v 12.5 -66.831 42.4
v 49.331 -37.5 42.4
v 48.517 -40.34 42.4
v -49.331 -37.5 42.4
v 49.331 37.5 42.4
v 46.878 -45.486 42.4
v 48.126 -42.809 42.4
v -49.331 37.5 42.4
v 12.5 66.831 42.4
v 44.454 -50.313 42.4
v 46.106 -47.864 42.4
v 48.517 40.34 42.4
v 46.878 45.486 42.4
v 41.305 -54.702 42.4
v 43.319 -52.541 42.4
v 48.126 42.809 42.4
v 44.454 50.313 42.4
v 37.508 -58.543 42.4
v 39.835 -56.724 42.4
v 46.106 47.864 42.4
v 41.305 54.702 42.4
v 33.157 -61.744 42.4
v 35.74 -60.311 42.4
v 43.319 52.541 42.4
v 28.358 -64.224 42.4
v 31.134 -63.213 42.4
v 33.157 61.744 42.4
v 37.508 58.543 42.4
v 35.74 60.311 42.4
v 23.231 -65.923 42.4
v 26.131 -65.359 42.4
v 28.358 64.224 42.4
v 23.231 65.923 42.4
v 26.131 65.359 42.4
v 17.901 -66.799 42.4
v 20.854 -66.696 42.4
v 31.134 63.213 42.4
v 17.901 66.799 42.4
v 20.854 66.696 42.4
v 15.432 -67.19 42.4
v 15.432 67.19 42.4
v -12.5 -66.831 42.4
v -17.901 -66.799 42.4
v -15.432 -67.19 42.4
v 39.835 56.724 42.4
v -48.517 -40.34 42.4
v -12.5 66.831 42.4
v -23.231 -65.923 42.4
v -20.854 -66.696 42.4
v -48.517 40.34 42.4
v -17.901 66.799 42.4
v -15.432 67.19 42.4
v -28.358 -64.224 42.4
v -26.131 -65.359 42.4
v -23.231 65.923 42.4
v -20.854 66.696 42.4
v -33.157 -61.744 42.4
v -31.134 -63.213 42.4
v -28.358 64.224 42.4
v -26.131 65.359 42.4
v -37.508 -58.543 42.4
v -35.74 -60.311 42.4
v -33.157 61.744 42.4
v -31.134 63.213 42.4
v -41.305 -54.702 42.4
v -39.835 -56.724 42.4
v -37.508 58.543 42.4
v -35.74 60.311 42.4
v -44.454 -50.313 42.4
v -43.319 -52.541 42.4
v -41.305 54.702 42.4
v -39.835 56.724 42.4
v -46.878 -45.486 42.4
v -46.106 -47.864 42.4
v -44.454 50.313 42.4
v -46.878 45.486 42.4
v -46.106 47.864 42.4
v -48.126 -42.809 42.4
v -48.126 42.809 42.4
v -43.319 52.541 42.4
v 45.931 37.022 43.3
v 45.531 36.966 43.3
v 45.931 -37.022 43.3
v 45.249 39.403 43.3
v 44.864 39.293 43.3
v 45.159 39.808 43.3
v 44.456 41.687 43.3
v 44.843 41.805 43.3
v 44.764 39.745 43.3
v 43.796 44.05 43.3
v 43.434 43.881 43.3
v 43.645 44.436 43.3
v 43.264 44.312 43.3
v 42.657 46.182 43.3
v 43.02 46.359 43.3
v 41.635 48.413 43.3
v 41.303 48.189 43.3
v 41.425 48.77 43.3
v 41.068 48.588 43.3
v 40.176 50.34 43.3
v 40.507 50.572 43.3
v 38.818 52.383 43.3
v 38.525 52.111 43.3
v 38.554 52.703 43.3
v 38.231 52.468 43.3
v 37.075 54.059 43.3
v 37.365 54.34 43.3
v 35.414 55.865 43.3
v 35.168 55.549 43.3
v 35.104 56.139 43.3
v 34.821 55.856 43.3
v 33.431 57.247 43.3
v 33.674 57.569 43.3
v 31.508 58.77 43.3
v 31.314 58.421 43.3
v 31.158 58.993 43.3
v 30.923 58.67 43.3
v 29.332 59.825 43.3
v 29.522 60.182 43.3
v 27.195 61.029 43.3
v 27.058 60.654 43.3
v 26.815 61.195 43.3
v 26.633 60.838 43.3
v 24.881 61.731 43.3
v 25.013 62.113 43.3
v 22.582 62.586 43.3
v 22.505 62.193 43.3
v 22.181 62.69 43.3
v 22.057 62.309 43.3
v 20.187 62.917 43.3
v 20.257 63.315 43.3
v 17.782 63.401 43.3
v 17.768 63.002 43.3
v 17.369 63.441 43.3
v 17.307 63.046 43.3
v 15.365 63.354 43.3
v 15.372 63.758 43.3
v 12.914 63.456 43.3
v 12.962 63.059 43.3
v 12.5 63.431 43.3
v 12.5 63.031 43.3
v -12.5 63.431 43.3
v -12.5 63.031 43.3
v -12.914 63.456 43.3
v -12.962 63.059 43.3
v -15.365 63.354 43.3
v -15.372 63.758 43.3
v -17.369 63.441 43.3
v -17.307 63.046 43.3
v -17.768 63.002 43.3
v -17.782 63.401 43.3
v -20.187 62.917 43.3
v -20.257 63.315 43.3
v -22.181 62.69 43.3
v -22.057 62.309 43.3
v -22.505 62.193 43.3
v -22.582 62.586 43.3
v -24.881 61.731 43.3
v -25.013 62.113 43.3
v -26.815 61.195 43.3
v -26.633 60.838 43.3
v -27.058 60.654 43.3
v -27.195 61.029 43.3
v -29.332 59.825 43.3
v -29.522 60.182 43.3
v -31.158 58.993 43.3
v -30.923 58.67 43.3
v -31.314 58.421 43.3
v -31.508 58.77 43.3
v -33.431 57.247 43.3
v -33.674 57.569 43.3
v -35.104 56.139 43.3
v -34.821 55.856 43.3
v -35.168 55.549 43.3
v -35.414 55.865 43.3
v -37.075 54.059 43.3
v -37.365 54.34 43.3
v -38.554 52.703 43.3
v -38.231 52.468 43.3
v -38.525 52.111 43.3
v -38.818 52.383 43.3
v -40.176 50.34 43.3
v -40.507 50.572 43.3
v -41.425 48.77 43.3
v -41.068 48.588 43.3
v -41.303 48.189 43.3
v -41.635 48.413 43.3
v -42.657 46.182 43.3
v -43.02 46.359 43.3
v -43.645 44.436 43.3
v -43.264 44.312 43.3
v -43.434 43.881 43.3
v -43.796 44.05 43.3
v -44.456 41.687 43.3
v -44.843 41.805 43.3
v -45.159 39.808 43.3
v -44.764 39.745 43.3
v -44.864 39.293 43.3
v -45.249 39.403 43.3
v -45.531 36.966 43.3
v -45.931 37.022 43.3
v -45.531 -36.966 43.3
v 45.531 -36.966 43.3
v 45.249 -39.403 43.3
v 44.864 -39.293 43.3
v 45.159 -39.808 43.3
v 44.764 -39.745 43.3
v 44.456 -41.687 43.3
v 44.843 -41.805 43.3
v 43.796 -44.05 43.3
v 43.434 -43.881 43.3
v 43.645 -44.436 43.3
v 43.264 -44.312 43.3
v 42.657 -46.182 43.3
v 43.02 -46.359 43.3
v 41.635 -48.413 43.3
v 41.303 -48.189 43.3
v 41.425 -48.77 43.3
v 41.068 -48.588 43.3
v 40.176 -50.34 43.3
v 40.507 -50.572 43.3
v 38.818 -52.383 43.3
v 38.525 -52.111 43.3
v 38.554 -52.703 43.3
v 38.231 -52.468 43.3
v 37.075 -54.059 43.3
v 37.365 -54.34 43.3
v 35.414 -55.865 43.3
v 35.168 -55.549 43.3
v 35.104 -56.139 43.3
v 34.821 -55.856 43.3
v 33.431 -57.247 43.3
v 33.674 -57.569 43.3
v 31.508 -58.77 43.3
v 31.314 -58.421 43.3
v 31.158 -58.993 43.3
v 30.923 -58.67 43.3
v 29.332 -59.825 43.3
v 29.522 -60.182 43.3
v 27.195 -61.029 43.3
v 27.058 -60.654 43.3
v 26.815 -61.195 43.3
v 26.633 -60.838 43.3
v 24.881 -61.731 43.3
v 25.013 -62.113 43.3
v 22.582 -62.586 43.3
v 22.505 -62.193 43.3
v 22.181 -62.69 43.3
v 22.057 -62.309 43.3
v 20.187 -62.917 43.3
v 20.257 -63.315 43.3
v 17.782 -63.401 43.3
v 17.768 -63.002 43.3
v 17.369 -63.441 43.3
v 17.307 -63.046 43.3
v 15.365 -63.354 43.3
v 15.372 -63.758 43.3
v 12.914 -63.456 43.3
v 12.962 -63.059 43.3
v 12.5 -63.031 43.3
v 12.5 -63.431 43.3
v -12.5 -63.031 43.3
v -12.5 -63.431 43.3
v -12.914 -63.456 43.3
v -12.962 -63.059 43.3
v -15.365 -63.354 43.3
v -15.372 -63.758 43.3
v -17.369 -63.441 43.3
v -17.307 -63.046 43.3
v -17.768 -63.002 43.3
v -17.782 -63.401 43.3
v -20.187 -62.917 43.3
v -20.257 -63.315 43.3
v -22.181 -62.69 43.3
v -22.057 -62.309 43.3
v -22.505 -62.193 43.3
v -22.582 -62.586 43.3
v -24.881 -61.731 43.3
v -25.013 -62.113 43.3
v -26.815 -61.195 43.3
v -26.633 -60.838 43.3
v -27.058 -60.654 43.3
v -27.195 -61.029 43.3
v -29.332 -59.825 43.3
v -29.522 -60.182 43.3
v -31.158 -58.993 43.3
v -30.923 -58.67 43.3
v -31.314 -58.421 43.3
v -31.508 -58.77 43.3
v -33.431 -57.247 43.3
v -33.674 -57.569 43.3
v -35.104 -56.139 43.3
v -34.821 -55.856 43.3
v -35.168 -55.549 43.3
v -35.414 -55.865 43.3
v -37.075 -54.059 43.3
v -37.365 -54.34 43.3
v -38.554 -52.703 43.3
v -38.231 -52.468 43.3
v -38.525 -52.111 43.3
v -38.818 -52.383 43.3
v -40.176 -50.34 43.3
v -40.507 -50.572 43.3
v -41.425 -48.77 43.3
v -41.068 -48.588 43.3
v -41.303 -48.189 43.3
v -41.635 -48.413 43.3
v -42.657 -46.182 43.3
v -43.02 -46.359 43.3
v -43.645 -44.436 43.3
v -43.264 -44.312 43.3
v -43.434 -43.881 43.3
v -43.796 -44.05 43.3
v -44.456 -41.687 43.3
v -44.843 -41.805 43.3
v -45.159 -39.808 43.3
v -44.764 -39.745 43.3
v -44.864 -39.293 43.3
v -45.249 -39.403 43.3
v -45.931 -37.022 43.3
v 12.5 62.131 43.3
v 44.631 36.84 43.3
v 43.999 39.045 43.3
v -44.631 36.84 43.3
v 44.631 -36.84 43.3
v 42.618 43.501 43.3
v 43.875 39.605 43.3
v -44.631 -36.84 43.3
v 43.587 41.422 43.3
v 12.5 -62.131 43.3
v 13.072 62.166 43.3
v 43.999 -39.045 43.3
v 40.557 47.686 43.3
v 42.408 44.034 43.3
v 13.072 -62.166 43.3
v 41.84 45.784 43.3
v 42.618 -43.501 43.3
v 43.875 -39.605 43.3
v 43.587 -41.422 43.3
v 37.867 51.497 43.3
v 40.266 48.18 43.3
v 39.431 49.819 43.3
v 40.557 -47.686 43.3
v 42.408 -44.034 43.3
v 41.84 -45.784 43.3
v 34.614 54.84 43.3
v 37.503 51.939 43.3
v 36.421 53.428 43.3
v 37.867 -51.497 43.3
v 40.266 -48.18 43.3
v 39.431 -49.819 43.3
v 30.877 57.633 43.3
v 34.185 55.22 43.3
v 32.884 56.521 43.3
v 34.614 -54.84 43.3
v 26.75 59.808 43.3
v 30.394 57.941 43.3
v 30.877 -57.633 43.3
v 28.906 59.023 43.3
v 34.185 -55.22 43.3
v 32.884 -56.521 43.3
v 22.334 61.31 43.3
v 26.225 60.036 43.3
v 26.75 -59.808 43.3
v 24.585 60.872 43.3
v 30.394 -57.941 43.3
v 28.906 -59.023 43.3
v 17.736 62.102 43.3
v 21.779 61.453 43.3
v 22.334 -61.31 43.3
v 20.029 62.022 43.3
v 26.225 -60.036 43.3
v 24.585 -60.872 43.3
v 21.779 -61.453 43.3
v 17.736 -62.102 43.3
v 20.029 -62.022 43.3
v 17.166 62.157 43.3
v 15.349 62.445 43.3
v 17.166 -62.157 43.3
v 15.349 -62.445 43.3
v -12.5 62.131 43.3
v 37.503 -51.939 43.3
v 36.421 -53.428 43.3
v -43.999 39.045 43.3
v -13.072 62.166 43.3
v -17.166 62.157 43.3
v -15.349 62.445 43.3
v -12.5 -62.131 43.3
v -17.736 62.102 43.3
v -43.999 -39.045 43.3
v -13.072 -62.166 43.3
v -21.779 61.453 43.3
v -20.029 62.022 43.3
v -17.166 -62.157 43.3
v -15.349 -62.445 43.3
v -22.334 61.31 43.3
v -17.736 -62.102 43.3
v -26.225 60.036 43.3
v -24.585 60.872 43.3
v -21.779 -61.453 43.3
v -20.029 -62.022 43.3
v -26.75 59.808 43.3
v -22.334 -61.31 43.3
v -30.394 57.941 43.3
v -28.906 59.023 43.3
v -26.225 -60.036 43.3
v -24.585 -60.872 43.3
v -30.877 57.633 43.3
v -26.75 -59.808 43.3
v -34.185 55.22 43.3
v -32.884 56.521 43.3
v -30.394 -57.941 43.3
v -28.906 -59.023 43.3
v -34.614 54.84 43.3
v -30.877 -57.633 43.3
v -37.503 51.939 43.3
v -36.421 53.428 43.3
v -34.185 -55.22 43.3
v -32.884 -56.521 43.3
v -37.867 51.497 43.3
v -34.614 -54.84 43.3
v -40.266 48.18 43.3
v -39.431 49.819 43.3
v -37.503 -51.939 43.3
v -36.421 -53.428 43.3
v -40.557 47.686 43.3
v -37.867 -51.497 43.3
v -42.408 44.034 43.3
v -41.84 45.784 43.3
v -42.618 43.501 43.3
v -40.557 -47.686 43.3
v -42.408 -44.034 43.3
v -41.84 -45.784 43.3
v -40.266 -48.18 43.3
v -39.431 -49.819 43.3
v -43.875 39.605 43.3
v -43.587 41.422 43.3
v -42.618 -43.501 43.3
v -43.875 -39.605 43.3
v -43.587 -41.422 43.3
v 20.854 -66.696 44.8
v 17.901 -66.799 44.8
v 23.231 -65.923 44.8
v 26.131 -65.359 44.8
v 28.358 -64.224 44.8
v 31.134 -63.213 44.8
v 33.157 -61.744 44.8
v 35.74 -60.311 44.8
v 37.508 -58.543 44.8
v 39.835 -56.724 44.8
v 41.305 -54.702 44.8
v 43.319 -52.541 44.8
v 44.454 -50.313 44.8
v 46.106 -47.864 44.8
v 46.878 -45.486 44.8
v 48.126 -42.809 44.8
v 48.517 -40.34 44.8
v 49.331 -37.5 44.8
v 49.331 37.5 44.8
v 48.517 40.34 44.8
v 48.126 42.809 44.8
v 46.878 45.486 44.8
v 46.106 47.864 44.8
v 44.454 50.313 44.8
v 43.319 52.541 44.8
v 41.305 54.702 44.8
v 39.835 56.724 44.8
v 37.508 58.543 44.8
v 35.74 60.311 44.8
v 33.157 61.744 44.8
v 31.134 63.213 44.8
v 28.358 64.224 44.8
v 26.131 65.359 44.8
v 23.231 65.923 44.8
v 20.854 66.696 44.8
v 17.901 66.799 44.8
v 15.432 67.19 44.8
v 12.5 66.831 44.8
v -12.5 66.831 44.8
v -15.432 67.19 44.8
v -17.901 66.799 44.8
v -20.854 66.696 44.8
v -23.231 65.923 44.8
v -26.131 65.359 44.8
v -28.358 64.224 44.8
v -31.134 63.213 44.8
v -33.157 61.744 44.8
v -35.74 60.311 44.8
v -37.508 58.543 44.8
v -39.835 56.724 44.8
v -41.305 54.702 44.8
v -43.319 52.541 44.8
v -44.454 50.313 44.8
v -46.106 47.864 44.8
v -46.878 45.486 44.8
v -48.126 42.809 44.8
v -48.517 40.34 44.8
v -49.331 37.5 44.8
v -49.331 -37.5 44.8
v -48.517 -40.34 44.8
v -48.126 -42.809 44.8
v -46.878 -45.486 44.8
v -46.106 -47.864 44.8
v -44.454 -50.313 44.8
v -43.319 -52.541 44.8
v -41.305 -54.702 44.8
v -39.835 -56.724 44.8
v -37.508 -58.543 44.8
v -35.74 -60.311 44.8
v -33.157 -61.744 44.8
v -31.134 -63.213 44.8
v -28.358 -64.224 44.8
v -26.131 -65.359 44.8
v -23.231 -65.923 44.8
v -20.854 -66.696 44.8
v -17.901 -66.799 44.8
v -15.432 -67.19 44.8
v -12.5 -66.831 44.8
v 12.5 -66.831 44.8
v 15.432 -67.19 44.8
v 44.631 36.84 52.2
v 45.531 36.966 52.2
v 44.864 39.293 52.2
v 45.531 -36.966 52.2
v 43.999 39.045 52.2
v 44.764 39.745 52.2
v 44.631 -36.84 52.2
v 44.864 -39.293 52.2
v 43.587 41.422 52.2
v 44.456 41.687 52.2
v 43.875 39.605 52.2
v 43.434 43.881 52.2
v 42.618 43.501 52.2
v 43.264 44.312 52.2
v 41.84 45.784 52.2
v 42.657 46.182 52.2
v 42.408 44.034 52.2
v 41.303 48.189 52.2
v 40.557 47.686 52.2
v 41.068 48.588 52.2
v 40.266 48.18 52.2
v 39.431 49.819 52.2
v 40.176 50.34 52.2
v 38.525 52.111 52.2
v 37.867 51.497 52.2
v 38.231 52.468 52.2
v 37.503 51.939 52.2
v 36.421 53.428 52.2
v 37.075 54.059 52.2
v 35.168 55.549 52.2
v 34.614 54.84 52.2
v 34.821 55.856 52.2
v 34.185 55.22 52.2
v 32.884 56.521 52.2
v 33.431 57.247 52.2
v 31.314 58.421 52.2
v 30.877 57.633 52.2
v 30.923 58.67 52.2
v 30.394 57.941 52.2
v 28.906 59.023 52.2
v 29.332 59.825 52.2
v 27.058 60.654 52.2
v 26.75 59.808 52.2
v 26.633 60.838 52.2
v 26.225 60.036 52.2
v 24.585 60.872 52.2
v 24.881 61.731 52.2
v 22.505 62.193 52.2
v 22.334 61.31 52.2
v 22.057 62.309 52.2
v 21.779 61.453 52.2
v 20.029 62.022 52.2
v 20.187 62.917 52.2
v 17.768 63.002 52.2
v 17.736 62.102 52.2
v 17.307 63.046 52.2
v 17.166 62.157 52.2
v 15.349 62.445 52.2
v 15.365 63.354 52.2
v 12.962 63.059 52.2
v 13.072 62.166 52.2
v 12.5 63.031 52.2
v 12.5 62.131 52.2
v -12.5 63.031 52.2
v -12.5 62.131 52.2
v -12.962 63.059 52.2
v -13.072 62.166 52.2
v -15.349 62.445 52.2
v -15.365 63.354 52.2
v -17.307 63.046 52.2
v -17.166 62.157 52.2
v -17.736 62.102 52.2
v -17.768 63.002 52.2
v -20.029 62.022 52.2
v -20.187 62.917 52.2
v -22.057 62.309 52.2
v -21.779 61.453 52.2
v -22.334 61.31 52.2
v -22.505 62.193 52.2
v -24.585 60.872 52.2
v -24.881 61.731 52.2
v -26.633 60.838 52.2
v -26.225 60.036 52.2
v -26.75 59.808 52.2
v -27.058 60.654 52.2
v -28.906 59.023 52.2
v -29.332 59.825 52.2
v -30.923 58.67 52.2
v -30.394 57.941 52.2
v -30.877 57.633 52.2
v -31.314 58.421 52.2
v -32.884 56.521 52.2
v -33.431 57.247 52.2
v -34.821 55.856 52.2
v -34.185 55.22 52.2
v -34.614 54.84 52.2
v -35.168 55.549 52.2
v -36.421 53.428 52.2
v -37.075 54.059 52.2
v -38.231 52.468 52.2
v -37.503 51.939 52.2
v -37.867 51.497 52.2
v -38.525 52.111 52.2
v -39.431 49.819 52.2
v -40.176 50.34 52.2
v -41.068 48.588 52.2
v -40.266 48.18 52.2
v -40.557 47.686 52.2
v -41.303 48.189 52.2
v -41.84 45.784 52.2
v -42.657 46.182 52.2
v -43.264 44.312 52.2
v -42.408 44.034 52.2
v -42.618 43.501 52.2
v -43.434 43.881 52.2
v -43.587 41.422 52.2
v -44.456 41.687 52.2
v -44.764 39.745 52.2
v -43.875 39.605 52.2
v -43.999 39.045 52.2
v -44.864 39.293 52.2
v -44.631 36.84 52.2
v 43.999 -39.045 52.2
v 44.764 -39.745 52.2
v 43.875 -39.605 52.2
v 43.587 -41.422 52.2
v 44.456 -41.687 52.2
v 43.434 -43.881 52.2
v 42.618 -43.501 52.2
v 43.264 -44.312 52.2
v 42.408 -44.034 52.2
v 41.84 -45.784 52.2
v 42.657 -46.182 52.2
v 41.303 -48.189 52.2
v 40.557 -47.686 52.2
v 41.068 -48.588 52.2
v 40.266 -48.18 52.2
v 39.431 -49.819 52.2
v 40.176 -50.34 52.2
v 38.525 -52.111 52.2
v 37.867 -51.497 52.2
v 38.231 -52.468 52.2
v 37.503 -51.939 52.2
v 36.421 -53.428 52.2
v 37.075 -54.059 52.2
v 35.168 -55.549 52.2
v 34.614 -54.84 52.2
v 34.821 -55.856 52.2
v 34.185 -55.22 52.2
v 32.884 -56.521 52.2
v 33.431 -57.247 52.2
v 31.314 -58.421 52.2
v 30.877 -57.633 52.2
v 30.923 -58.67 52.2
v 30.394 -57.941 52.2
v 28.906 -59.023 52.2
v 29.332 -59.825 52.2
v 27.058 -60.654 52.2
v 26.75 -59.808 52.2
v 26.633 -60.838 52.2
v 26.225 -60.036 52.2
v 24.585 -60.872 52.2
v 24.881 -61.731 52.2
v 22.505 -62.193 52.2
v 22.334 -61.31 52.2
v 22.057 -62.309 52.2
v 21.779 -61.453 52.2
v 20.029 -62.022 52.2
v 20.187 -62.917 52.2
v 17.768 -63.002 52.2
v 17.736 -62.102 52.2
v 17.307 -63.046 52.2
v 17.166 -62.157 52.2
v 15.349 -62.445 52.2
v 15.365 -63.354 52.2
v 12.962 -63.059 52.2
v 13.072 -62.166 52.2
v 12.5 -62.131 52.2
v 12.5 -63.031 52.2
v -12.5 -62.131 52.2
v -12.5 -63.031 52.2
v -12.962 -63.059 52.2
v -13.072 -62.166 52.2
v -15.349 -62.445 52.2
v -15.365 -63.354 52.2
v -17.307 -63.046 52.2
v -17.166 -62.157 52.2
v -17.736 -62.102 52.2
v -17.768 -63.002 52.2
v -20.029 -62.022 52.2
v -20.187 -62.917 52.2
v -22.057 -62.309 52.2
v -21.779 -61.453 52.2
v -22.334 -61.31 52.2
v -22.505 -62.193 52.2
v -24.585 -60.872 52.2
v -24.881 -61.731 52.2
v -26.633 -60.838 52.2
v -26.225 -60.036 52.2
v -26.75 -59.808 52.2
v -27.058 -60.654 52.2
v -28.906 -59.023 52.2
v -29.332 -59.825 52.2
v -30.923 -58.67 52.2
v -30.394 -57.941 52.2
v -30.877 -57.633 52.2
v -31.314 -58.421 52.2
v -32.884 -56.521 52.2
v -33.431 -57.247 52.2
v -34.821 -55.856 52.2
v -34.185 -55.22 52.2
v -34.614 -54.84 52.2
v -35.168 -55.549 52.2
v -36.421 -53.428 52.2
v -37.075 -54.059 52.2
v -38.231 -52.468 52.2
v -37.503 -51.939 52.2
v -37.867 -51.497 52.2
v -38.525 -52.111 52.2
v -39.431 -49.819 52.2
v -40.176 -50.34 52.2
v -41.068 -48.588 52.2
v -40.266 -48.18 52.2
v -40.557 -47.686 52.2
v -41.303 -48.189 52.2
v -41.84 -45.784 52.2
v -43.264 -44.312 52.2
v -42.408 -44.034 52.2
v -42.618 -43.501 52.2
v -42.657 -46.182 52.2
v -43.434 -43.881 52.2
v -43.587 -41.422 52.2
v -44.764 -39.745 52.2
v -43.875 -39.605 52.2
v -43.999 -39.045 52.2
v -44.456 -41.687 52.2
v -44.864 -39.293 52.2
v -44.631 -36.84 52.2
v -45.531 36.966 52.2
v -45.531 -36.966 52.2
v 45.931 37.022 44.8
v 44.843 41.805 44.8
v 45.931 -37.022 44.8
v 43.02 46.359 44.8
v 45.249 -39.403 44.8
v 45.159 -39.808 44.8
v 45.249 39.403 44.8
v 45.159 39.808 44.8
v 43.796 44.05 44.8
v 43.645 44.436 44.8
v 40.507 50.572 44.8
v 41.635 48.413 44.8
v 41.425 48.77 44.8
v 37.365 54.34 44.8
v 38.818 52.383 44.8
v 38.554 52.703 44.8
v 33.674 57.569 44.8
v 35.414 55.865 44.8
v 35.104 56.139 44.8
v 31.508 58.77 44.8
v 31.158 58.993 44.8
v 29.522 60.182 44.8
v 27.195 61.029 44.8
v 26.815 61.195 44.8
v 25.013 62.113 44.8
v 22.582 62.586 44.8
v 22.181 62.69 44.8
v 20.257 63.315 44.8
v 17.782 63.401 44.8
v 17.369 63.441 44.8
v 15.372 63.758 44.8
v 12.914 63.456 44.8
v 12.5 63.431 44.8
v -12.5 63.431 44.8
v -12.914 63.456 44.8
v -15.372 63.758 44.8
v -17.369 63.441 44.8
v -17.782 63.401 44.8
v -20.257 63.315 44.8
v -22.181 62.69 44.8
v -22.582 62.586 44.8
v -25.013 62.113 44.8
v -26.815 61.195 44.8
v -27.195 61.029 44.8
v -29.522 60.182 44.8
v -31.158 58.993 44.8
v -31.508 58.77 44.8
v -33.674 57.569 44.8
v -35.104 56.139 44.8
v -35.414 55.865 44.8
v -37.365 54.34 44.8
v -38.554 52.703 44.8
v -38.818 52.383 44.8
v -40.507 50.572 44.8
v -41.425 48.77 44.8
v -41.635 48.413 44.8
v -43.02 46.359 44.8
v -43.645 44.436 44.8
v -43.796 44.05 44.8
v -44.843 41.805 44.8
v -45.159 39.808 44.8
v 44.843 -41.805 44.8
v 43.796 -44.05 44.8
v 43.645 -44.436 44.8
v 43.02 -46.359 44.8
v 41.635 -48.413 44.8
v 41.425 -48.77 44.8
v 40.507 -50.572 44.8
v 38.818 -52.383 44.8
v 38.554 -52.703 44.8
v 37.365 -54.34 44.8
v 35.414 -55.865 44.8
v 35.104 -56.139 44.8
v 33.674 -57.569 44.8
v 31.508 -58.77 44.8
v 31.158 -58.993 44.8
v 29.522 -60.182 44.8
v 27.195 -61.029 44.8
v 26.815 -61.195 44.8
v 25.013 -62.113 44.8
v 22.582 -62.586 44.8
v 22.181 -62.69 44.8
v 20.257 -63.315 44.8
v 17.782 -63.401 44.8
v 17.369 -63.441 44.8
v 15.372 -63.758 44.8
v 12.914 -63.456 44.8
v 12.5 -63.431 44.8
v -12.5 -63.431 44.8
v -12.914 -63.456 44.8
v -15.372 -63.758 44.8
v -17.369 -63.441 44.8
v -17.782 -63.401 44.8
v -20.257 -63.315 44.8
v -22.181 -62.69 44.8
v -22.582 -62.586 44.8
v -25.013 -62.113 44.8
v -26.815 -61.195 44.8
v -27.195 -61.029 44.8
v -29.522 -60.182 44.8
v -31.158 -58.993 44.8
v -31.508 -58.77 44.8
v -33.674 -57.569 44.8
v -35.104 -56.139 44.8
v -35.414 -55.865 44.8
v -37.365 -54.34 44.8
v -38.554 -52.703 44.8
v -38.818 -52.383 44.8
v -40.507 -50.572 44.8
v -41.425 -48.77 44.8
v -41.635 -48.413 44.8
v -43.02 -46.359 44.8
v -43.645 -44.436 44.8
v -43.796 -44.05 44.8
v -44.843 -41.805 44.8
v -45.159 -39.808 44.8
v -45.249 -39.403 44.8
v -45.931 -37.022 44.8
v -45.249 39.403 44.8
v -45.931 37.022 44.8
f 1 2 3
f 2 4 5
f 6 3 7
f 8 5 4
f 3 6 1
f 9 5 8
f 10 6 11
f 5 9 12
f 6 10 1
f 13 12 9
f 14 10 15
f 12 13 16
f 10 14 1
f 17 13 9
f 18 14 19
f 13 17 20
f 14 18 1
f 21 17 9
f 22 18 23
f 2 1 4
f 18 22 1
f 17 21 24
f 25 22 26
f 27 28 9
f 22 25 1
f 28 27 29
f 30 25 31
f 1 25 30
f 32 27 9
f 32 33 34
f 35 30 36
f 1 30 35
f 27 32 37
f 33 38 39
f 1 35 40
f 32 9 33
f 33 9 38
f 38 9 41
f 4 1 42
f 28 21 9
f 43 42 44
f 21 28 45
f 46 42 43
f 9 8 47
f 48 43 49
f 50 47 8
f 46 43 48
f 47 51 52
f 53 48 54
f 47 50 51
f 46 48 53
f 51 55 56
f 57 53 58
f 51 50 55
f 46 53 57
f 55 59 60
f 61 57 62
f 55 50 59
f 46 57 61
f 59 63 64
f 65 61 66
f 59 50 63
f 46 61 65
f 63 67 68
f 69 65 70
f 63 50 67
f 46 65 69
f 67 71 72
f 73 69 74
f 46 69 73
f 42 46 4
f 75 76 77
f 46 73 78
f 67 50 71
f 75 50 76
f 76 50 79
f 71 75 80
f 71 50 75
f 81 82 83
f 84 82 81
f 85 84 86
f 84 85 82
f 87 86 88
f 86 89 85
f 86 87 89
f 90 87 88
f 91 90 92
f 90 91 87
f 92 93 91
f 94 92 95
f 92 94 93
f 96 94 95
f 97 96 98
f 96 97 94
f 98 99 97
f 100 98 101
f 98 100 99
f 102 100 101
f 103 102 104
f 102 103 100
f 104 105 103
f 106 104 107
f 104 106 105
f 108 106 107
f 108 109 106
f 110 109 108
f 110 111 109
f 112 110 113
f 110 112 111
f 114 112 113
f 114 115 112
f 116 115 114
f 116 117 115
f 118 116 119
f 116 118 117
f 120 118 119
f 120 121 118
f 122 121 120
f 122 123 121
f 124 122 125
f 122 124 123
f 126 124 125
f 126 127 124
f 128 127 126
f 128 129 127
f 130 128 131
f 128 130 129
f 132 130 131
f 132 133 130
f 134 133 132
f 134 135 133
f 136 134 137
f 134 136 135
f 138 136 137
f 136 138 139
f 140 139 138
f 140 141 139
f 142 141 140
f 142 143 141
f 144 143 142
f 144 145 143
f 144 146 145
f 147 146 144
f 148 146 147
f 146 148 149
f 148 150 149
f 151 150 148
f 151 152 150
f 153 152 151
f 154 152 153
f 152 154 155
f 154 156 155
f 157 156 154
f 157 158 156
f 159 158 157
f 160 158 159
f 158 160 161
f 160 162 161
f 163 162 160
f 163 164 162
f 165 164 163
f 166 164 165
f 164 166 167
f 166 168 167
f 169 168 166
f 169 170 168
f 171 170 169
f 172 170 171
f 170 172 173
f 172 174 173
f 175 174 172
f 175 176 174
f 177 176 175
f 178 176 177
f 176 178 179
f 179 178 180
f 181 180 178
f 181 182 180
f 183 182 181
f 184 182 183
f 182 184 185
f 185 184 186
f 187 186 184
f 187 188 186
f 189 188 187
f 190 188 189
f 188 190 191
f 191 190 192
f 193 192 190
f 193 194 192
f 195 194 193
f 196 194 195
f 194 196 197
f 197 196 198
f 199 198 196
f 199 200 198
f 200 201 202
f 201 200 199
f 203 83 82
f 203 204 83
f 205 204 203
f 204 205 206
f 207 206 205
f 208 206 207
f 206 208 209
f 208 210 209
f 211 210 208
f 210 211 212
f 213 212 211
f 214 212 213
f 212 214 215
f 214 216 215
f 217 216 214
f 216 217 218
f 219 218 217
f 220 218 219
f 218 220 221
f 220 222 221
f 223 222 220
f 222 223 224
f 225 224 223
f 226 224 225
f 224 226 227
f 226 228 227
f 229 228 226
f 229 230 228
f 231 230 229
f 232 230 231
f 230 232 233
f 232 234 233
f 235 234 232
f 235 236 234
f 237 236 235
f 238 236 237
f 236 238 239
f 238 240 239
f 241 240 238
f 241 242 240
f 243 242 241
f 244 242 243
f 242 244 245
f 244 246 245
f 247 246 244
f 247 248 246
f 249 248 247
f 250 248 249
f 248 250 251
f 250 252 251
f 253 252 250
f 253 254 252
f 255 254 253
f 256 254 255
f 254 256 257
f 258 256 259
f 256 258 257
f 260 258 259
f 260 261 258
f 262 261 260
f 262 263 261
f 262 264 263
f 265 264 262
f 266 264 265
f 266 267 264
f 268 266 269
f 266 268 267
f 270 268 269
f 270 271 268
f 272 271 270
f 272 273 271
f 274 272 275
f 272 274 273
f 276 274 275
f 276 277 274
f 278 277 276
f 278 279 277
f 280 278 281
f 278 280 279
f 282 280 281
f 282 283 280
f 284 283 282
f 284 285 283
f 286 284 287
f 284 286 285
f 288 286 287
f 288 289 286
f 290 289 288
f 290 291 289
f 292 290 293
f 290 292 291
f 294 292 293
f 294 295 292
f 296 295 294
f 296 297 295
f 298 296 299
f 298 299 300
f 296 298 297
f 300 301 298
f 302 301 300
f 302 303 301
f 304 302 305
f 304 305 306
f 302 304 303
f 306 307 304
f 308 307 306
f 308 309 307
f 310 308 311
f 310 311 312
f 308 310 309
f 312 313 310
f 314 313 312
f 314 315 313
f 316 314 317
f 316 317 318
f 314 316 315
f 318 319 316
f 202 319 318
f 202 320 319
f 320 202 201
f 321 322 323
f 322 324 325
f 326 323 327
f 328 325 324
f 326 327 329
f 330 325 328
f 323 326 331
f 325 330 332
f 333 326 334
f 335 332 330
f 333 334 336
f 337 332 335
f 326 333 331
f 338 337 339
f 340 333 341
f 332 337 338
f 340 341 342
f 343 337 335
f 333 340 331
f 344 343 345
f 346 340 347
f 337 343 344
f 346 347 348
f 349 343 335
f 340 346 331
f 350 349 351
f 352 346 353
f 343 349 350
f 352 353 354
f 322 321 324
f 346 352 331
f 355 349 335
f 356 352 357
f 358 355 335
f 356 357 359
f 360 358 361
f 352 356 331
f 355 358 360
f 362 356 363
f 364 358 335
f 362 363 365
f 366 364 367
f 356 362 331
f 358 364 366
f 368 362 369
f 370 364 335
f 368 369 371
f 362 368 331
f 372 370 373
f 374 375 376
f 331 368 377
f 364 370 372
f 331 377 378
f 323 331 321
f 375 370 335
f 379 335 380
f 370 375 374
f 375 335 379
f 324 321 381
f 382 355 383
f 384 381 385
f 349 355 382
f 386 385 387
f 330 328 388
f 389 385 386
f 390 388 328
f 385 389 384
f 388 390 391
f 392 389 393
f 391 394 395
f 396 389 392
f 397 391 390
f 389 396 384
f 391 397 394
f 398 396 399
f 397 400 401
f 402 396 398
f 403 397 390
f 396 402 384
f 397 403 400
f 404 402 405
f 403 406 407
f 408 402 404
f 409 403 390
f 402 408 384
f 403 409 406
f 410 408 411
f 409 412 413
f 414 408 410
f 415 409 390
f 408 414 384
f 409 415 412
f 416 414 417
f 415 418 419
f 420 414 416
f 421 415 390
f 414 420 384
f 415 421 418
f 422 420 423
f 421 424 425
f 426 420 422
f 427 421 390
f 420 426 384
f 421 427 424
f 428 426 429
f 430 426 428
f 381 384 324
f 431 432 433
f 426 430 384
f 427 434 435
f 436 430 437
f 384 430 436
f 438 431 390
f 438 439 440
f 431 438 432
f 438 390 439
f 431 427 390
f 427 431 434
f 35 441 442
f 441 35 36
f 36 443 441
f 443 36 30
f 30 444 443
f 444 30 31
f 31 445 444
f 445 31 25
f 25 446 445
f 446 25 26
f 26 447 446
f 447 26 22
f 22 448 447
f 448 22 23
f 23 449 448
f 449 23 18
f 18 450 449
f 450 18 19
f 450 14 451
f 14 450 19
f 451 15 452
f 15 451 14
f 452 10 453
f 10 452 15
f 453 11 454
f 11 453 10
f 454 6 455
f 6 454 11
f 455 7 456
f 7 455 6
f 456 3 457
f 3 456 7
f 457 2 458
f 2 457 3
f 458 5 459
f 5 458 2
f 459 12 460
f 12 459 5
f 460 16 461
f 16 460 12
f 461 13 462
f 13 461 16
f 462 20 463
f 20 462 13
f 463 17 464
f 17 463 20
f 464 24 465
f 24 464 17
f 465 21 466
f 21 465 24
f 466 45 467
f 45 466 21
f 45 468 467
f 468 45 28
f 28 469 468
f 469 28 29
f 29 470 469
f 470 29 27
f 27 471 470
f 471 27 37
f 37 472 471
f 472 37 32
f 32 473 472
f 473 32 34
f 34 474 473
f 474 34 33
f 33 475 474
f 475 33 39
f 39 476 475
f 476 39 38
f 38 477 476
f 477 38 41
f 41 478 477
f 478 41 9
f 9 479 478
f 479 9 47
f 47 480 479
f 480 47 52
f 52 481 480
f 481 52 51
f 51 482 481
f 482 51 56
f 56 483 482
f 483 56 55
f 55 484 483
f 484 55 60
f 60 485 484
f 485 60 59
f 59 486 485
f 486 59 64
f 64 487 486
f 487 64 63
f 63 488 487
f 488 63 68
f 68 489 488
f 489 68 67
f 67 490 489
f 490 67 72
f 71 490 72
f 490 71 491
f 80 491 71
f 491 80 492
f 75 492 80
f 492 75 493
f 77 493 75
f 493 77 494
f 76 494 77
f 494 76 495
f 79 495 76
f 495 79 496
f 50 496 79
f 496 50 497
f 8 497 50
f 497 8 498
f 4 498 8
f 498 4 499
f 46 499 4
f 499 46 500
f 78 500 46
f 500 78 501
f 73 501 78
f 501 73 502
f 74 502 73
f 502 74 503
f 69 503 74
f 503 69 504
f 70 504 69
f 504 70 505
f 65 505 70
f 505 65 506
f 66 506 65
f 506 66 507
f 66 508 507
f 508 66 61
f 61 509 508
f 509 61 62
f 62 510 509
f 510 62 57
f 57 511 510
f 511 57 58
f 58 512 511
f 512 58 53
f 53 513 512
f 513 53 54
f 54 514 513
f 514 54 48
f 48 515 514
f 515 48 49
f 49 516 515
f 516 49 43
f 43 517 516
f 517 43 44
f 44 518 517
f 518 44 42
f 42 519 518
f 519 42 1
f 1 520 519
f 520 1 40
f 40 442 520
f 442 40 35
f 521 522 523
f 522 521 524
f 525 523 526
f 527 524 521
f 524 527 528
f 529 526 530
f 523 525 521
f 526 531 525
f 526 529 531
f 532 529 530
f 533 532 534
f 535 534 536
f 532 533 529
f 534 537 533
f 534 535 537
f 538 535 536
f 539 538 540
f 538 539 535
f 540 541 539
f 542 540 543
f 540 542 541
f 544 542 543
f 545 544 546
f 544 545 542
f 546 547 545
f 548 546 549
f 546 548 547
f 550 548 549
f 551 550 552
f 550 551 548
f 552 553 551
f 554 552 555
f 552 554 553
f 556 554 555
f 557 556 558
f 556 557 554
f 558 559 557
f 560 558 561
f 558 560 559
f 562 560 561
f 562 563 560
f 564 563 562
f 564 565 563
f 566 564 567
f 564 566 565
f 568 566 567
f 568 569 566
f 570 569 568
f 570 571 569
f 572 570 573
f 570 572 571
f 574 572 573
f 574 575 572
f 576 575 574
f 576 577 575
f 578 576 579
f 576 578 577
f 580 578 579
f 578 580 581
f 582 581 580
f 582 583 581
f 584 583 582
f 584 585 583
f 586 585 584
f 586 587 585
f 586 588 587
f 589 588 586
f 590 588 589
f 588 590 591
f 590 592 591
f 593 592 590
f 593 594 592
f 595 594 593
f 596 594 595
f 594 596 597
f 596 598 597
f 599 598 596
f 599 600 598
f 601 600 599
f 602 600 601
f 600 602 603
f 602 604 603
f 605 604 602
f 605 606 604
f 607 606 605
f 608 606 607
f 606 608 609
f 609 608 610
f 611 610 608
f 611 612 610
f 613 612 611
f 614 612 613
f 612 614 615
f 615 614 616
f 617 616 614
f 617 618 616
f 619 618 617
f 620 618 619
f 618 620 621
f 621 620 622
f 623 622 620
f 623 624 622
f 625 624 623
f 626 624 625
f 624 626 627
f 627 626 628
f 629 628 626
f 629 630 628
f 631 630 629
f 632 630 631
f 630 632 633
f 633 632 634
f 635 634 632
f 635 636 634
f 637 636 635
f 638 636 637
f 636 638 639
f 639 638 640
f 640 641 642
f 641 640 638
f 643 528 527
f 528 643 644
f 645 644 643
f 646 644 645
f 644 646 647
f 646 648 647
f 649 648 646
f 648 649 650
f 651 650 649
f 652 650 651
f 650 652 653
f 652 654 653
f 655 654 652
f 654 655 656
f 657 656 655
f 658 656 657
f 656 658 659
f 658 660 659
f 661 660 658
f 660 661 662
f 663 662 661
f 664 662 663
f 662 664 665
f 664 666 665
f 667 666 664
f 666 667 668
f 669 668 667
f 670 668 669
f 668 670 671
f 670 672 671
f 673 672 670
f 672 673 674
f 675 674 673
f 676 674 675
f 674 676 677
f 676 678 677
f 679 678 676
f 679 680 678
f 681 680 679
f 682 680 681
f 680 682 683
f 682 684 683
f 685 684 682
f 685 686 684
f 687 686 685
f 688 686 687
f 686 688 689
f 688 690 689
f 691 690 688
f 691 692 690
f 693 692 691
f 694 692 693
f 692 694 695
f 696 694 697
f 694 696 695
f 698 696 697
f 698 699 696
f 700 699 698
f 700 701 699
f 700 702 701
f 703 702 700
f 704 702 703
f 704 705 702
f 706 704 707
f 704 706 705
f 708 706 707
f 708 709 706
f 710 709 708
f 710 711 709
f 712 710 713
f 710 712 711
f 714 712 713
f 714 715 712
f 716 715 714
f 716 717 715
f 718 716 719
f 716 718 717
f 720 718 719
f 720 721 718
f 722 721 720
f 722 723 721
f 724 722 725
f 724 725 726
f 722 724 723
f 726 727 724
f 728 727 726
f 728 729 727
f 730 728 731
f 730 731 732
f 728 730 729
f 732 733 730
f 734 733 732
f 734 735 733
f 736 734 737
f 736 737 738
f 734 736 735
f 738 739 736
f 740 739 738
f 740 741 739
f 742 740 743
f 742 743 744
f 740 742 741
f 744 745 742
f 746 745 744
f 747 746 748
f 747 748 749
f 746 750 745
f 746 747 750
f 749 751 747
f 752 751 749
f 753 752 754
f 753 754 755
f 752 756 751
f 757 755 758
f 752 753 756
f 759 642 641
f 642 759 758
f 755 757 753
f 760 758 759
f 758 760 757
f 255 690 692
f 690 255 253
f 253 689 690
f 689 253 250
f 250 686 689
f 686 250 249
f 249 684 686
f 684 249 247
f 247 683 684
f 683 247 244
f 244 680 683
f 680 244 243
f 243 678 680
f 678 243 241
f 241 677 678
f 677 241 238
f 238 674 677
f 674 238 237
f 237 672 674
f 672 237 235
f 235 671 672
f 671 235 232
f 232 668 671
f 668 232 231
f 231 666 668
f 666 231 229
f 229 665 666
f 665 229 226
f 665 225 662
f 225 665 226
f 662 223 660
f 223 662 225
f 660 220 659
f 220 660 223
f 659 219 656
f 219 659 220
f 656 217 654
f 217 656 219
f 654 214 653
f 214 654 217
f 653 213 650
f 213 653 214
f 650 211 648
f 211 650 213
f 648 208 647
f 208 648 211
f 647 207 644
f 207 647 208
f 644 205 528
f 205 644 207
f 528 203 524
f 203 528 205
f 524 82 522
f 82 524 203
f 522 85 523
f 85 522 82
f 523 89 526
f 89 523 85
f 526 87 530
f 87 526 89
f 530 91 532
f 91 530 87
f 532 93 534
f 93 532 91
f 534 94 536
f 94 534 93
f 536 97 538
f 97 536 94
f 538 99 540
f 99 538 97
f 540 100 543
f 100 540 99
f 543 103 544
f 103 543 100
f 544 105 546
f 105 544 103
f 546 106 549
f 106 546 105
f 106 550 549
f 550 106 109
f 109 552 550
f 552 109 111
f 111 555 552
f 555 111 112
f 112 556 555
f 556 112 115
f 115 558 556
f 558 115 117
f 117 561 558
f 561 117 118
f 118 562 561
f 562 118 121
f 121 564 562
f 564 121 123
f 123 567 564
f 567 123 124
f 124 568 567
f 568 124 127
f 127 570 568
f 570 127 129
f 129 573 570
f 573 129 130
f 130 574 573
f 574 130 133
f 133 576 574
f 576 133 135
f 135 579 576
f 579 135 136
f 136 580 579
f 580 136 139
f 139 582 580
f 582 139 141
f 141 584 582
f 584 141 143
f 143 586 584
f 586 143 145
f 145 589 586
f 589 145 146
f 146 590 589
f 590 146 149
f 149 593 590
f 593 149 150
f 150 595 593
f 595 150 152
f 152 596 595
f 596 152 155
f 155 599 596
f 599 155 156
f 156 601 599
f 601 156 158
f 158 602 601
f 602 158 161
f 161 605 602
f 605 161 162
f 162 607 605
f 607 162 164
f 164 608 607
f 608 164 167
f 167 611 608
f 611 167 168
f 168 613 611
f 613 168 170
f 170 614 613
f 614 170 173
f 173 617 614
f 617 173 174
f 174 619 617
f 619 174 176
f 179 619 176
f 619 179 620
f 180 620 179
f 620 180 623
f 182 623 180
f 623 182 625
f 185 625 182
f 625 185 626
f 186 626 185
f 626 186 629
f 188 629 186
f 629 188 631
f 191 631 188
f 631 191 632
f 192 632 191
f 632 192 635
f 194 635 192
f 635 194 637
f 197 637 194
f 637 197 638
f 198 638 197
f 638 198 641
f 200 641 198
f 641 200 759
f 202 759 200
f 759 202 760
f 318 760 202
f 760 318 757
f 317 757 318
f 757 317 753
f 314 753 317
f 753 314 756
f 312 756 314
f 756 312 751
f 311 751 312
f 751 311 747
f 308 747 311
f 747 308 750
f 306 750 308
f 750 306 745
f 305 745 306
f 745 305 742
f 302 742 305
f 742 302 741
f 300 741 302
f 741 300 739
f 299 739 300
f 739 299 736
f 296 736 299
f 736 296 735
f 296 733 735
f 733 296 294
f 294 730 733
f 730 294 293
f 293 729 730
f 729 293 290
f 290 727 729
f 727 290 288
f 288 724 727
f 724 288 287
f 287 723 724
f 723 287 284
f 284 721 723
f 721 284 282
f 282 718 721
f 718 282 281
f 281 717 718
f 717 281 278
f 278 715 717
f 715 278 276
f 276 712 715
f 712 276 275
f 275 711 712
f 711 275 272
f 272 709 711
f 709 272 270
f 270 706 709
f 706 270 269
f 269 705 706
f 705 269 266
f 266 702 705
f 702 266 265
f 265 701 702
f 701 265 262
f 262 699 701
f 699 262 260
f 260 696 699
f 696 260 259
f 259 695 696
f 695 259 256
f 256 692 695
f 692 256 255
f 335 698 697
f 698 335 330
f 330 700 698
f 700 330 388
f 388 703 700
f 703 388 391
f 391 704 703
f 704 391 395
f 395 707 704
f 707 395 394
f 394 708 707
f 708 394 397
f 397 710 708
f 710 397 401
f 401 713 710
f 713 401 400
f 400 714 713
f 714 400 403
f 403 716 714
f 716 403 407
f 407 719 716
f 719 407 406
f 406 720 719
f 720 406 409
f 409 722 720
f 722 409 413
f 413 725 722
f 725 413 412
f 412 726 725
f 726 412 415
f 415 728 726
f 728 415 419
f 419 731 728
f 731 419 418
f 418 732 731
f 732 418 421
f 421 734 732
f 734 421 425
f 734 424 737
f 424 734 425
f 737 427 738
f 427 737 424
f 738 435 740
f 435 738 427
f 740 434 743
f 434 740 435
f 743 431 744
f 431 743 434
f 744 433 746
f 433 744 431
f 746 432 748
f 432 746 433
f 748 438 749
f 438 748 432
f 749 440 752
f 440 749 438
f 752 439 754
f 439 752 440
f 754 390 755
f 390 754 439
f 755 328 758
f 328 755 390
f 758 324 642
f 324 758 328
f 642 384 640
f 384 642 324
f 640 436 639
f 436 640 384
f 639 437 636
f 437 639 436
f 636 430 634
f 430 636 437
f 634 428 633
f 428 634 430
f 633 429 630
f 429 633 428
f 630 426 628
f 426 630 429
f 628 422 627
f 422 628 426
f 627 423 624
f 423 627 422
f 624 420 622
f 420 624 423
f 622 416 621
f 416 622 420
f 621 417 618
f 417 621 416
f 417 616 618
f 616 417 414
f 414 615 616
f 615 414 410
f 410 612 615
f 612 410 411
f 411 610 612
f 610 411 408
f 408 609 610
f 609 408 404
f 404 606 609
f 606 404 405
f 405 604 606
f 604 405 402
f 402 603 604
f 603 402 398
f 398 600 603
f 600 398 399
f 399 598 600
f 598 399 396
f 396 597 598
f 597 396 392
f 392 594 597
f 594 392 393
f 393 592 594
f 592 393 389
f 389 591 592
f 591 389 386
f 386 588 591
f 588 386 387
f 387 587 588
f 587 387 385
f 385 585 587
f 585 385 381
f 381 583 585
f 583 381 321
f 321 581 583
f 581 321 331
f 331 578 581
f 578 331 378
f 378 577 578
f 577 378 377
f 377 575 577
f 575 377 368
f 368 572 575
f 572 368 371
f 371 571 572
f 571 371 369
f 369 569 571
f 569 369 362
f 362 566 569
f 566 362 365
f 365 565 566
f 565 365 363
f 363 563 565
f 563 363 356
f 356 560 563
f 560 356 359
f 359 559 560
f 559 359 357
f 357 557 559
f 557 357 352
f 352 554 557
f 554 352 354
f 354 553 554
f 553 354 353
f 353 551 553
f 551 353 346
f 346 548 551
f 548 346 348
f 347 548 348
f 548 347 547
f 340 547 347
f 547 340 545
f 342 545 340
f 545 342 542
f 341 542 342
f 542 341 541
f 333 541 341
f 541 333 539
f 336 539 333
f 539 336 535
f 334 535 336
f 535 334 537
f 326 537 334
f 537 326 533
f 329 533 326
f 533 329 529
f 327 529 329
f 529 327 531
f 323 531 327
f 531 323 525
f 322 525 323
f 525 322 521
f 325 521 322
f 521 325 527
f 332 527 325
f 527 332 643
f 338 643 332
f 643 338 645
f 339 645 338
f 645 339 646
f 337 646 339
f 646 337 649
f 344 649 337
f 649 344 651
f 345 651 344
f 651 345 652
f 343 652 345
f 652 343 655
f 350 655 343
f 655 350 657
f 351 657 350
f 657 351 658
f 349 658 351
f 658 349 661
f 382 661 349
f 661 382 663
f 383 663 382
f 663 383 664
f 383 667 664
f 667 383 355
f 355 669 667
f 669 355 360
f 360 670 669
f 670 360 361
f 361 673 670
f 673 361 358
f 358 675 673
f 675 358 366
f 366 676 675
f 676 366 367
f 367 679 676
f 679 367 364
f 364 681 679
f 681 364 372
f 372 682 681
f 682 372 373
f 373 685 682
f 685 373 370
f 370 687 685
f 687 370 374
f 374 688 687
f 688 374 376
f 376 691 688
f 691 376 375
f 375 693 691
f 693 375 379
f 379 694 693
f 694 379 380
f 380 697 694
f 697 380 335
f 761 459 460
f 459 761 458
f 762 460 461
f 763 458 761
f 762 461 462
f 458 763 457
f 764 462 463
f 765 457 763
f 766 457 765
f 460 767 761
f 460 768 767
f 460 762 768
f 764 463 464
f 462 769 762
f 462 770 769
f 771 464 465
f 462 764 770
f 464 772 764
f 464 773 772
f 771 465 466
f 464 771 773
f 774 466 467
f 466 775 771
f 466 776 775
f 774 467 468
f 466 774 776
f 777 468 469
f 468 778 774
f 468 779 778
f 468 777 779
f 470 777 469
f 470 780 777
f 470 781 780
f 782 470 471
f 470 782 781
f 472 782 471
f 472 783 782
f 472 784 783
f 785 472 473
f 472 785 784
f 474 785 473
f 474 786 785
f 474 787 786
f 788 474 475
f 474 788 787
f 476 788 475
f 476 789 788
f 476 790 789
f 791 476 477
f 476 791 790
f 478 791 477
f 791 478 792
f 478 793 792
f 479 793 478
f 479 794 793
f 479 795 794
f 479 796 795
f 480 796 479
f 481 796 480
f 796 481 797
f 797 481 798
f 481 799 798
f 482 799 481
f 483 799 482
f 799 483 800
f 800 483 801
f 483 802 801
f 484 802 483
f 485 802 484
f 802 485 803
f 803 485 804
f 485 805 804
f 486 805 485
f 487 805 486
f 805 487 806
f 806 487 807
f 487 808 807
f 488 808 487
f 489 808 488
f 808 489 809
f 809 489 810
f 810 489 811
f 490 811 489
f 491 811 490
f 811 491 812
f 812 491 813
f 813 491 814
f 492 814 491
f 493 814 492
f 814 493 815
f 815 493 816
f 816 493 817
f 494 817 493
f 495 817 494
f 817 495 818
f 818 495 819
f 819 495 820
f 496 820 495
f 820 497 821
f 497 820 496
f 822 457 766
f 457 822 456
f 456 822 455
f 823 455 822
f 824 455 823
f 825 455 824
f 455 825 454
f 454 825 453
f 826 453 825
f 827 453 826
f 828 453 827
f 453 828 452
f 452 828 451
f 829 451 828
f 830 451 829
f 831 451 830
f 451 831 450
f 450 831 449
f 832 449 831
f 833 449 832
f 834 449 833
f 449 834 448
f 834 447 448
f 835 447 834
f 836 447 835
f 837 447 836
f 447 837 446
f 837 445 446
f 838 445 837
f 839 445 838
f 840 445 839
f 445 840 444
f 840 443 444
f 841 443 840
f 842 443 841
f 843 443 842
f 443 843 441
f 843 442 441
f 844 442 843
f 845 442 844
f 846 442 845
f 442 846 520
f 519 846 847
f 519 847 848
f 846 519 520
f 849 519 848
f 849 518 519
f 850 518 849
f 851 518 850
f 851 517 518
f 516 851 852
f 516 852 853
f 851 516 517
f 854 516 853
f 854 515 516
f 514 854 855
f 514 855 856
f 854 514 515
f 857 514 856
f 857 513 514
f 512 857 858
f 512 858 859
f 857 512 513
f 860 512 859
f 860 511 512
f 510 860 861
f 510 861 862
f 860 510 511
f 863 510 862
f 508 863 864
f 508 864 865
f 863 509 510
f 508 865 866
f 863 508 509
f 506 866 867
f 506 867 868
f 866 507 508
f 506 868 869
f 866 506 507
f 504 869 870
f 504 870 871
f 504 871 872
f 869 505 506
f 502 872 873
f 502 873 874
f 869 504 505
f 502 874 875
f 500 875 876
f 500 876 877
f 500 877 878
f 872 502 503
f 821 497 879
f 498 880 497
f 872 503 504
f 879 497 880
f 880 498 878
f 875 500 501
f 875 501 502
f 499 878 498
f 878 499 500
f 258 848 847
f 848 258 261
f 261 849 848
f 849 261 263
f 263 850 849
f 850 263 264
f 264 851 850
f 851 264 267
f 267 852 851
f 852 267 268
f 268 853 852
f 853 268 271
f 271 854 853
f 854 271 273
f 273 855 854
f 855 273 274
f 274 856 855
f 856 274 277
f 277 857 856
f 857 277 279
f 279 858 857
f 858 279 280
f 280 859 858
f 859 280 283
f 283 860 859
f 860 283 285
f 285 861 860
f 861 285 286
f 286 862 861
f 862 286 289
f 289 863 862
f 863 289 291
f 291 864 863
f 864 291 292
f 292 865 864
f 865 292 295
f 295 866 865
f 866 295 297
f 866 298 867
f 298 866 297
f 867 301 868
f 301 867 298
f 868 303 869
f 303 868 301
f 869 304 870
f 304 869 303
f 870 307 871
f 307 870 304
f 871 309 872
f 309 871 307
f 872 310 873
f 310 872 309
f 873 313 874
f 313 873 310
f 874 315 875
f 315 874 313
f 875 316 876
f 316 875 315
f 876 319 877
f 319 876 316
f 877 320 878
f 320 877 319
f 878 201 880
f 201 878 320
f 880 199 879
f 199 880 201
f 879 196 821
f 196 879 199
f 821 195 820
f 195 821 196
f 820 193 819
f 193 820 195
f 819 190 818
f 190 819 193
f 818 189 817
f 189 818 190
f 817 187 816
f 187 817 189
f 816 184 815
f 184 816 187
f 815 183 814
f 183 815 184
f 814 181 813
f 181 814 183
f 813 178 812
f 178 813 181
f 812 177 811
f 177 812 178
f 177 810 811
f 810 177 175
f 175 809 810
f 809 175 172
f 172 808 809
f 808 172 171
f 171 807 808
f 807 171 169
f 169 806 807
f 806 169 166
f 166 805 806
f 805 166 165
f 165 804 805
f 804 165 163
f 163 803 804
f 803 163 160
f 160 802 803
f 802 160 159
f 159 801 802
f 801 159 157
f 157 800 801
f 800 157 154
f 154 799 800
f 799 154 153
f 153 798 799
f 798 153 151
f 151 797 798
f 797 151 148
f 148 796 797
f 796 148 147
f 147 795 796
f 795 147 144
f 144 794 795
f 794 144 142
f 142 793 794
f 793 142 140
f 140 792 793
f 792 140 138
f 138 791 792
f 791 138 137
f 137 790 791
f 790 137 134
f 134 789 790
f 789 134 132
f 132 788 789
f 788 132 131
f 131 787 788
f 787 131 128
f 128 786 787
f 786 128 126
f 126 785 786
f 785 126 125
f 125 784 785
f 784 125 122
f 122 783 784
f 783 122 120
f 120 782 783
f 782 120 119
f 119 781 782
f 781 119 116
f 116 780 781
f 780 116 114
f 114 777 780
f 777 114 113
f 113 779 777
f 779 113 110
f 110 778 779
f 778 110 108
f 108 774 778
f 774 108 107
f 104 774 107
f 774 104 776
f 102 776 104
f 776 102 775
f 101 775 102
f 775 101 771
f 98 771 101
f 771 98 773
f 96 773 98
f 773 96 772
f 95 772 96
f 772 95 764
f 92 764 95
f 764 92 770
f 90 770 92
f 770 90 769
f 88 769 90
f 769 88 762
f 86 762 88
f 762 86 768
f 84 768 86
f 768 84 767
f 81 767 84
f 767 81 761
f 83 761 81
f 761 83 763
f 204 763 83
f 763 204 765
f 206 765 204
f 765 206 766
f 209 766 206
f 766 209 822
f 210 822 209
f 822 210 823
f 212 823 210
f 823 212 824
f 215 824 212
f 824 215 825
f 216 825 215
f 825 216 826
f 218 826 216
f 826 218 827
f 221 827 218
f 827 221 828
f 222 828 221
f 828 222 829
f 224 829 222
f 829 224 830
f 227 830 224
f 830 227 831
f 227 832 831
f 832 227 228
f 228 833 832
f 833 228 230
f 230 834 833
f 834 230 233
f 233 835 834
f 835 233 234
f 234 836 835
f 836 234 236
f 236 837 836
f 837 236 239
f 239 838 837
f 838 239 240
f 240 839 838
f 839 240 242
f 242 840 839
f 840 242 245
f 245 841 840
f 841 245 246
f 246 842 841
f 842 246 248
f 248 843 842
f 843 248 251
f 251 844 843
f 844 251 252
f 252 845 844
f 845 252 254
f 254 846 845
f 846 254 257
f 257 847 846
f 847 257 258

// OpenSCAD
// file: lib/polymath.scad
/*
 * Polygon math
 * Functions to create and manipulate polygons
 * 
 * Most functions return an array of points representing the transformed polygon
 */

function poly_arc(radius, angles, fn = 24) =  
    let(
      r = radius / cos(180 / fn),
      step = 360 / fn)

    [for(a = [angles[0] : step : angles[1]]) 
        [r * cos(a), r * sin(a)]
    ];

function poly_rect(dx, dy) =  
    [[-dx, -dy],[-dx, dy], [dx, dy], [dx, -dy]];

function poly_cicle(pts, start, dir) =
  let(
    l = len(pts) ,
    s = dir == 1? start: l + start,
    e = dir == 1? l + start: start,
    st =dir == 1? 1:-1
  )
  [for(i = [s:st:e - dir]) 
    pts[i % l]
  ];

function sublist(pts, start, end) = 
  start >= end ? [] :
  [for(i = [start:end - 1]) pts[i]];
    

function reverse(pts) = 
  [for (i = [len(pts) - 1: -1: 0]) pts[i]];


/**
 * Join two polygons by joining vertices
 *
 * pts: the first polygon
 * pt: the index of the last vertex of the first polygon
 * target: the second polygon
 * start: the index of the first vertex of the second polygon
 * dir: the direction of the second polygon
 *
 * for 2 rectangles created with poly_rect
 * to join them on the outside use dir = 1 and start = 
 *  3 left, 0 top, 1 right, 2 bottom
 * to join them on the inside (cut) use dir = -1 and start = 
 *  0 left, 1 top, 2 right, 3 bottom
 *

    p = poly_rect(10, 20);
    b = poly_rect(1, 2);

    //union
      //left
   //c = poly_join(p, 1, poly_trans(b, [-10-1,0]), 3, 1);
      //top
   // c = poly_join(p, 2, poly_trans(b, [0,20+2]), 0, 1);
      //right
   // c = poly_join(p, 3, poly_trans(b, [11,0]), 1, 1);
      //bottom
    //c = poly_join(p, 4, poly_trans(b, [0,-22]), 2, 1);

    //cut
      //left
    //c = poly_join(p, 1, poly_trans(b, [-10+1,0]), 0, -1);
      //top
    //c = poly_join(p, 2, poly_trans(b, [0,20-2]), 1, -1);
      //right
    // c = poly_join(p, 3, poly_trans(b, [10 - 1,0]), 2, -1);
      //bottom
    // c = poly_join(p, 4, poly_trans(b, [0,-20 +2]), 3,-1);
    polygon(c);
 */
function poly_join(pts, pt, target, start, dir) = 
  concat(sublist(pts, 0, pt), poly_cicle(target, start, dir), sublist(pts, pt, len(pts)));

function poly_pt_rot(pt, ang) = 
  let(
    mod = norm(pt), 
    a = atan2(pt[1], pt[0]), 
    tang = a + ang
  )
  [cos(tang) * mod, sin(tang) * mod];

function vec2(x=0, y=0) = 
  [x == undef ? 0:x, y == undef ? 0: y];

function poly_trans(pts, vec) = 
  [for(i = [0:len(pts) - 1]) pts[i] + vec];

function poly_mult(pts, vec) = 
  [for(i = [0:len(pts) - 1]) [pts[i].x * vec.x, pts[i].y * vec.y]];

function poly_rot(pts, ang) = 
  [for(i = [0:len(pts) - 1])  poly_pt_rot(pts[i], ang)];

/*
 * radv is a map of index to radius
 */
function poly_add_radius(pts, radv) = 
  [for(i = [0:len(pts) - 1]) 
    let(
      sr = search(i, radv), 
      rr = len(sr) > 0 ? radv[sr[0]][1] : 0,
      v = echo(sr)
    )
    [pts[i][0], pts[i][1], rr]];
// main file
include <lib/polymath.scad>

//caixa();
tampa();
//divs();



/* [Dimensoes] */

//altura
hh=40;

//num curva
nr = 10;

//num x
nl = 3;

//num y
nw = 7;



/* [Espessuras caixa] */
//esp. parede
ew = .9;

//esp. base;
eb = .6;



/* [Tampa] */
//esp. tampa
et = .9;

//tampa trava
tl = 8;

//tampa folga
tf = ew + .4;

//tampa esp externa
tr = 1.5;



/* [Divisorias] */
//esp divisoria
dw = .9;

//div quantidade x
dnx = 3;
//div quantidade y
dny = 3;


/* [Forma parede] */
//forma
f = [2.5, 2.5];




function radius(ang, n, w) = 
  (n * w * 360) / (ang * 2 * PI);

r = radius(90, nr, f.x*2);
  
function forma(x, y) =
  [[-x, 0], [0, y]];
  
function formb(x, y) =
  [[-x, y], [0, y]];


function arc(form, f, n, r, ang) = 
  n == 0 ? []:
  concat(
    arc(form, f, n - 1, r, ang),
    poly_rot(
      poly_trans(
        form, 
        [-f.x, r]), 
      -ang * (n )));
    
    
function line(form, f, n) = 
  n == 0 ? []:
  concat(
    line(form, f, n-1), 
    poly_trans(
      form, 
      [(n)*f.x*2 -f.x, 0]));



function round(form, f) =
let(
  res = arc(form, f, nr , r, 90/nr),
  res2 = poly_mult(res, [1,-1]),
    
  l1 = poly_trans(
          line(form, f, nl),
            ,[0, r]),
            
  l2 = reverse(poly_mult(l1, [1, -1])),

  a = poly_trans(
        concat(res,[[r, 0]], reverse(res2)),
        [nl * f.x*2, 0]),
        

        
  s1 = concat(l1, a, l2),
  s2 = reverse(poly_mult(s1, [-1, 1])))
concat(s1, s2);

//polygon(round());


function sq(form, f) =
let(

  a1 = 
    poly_trans(
      arc(form, f, nr , r, 90/nr),
      [nl * f.x*2, nw * f.x*2 - f.x]),
  
  a2 = poly_mult(reverse(a1), [1,-1]),
  
  lw = 
    reverse(
    poly_trans(
      poly_rot(
      line(form, f, nw),-90),
      [nl * f.x*2 + r,-f.x*2 +f.x])),
   
  lwm = poly_mult(reverse(lw), [1,-1]),
  
  l1 = poly_trans(
          line(form, f, nl),
            ,[0, r + nw*f.x*2 - f.x]),
            
  l2 = reverse(poly_mult(l1, [1, -1])),
  
  ma =concat(
    l1, 
    a1, 
    lw),
   
  mb = concat(
    lwm,
    a2, 
    l2),
    
  s = concat(ma, [[r+nl * f.x*2 + f.y, 0]], mb),
        
  sm = reverse(poly_mult(s, [-1, 1])))
//concat(mb);  
concat(s, sm);

function sizex() = 
  2*((f.x*2) * nl + r);
  
function sizey() = 
  2*((f.x*2) * nw - f.y + r);


module divs(){

module di(){
  s = sizey() / dnx;
  dih = hh - tl - et;
  
  if(dnx > 1)
  for(i = [1:dnx - 1])
  translate([0,sizey()/2 - i*s,dih/2])
  cube([sizex()+ 2*f.y,dw,dih], center=true);
    

  sy = sizex() / dny;

  if(dny > 1)
  for(i = [1:dny - 1])
  translate([sizex()/2 - i*sy,0,dih/2])
  cube([dw, sizey() + 2*f.y,dih], center=true);
}

intersection(){
  di();
  caixa_interior();
}
  
}


  

  




module caixa(){
  difference(){
  linear_extrude(hh) 
    polygon(sq(forma(f.x, f.y), f));
    
  caixa_interior();
  }
}

module caixa_interior(){
  translate([0,0,eb])
  linear_extrude(hh) 
    offset(-ew, $fn=12)
    polygon(sq(forma(f.x, f.y), f));
}



//#polygon(sq(forma(f.x, f.y), f));




module tampa(){
  translate([0,0,hh+et+tr])
  mirror([0,0,0])
  t();

  module t(){
    linear_extrude(et) 
      polygon(sq(formb(f.x, f.y), f));
    
    //lock
    translate([0,0,et])
    linear_extrude(et+ tl)
      difference(){
      offset(-f.y - tf) 
        polygon(sq(formb(f.x, f.y), f));
      offset(-f.y - tf - ew) 
          polygon(sq(formb(f.x, f.y), f));
      }
      
      //ring
    linear_extrude(et + tr) 
      difference(){
        polygon(sq(formb(f.x, f.y), f));
        offset(-f.y - ew) 
        polygon(sq(formb(f.x, f.y), f));    
        
      }
  }
}
